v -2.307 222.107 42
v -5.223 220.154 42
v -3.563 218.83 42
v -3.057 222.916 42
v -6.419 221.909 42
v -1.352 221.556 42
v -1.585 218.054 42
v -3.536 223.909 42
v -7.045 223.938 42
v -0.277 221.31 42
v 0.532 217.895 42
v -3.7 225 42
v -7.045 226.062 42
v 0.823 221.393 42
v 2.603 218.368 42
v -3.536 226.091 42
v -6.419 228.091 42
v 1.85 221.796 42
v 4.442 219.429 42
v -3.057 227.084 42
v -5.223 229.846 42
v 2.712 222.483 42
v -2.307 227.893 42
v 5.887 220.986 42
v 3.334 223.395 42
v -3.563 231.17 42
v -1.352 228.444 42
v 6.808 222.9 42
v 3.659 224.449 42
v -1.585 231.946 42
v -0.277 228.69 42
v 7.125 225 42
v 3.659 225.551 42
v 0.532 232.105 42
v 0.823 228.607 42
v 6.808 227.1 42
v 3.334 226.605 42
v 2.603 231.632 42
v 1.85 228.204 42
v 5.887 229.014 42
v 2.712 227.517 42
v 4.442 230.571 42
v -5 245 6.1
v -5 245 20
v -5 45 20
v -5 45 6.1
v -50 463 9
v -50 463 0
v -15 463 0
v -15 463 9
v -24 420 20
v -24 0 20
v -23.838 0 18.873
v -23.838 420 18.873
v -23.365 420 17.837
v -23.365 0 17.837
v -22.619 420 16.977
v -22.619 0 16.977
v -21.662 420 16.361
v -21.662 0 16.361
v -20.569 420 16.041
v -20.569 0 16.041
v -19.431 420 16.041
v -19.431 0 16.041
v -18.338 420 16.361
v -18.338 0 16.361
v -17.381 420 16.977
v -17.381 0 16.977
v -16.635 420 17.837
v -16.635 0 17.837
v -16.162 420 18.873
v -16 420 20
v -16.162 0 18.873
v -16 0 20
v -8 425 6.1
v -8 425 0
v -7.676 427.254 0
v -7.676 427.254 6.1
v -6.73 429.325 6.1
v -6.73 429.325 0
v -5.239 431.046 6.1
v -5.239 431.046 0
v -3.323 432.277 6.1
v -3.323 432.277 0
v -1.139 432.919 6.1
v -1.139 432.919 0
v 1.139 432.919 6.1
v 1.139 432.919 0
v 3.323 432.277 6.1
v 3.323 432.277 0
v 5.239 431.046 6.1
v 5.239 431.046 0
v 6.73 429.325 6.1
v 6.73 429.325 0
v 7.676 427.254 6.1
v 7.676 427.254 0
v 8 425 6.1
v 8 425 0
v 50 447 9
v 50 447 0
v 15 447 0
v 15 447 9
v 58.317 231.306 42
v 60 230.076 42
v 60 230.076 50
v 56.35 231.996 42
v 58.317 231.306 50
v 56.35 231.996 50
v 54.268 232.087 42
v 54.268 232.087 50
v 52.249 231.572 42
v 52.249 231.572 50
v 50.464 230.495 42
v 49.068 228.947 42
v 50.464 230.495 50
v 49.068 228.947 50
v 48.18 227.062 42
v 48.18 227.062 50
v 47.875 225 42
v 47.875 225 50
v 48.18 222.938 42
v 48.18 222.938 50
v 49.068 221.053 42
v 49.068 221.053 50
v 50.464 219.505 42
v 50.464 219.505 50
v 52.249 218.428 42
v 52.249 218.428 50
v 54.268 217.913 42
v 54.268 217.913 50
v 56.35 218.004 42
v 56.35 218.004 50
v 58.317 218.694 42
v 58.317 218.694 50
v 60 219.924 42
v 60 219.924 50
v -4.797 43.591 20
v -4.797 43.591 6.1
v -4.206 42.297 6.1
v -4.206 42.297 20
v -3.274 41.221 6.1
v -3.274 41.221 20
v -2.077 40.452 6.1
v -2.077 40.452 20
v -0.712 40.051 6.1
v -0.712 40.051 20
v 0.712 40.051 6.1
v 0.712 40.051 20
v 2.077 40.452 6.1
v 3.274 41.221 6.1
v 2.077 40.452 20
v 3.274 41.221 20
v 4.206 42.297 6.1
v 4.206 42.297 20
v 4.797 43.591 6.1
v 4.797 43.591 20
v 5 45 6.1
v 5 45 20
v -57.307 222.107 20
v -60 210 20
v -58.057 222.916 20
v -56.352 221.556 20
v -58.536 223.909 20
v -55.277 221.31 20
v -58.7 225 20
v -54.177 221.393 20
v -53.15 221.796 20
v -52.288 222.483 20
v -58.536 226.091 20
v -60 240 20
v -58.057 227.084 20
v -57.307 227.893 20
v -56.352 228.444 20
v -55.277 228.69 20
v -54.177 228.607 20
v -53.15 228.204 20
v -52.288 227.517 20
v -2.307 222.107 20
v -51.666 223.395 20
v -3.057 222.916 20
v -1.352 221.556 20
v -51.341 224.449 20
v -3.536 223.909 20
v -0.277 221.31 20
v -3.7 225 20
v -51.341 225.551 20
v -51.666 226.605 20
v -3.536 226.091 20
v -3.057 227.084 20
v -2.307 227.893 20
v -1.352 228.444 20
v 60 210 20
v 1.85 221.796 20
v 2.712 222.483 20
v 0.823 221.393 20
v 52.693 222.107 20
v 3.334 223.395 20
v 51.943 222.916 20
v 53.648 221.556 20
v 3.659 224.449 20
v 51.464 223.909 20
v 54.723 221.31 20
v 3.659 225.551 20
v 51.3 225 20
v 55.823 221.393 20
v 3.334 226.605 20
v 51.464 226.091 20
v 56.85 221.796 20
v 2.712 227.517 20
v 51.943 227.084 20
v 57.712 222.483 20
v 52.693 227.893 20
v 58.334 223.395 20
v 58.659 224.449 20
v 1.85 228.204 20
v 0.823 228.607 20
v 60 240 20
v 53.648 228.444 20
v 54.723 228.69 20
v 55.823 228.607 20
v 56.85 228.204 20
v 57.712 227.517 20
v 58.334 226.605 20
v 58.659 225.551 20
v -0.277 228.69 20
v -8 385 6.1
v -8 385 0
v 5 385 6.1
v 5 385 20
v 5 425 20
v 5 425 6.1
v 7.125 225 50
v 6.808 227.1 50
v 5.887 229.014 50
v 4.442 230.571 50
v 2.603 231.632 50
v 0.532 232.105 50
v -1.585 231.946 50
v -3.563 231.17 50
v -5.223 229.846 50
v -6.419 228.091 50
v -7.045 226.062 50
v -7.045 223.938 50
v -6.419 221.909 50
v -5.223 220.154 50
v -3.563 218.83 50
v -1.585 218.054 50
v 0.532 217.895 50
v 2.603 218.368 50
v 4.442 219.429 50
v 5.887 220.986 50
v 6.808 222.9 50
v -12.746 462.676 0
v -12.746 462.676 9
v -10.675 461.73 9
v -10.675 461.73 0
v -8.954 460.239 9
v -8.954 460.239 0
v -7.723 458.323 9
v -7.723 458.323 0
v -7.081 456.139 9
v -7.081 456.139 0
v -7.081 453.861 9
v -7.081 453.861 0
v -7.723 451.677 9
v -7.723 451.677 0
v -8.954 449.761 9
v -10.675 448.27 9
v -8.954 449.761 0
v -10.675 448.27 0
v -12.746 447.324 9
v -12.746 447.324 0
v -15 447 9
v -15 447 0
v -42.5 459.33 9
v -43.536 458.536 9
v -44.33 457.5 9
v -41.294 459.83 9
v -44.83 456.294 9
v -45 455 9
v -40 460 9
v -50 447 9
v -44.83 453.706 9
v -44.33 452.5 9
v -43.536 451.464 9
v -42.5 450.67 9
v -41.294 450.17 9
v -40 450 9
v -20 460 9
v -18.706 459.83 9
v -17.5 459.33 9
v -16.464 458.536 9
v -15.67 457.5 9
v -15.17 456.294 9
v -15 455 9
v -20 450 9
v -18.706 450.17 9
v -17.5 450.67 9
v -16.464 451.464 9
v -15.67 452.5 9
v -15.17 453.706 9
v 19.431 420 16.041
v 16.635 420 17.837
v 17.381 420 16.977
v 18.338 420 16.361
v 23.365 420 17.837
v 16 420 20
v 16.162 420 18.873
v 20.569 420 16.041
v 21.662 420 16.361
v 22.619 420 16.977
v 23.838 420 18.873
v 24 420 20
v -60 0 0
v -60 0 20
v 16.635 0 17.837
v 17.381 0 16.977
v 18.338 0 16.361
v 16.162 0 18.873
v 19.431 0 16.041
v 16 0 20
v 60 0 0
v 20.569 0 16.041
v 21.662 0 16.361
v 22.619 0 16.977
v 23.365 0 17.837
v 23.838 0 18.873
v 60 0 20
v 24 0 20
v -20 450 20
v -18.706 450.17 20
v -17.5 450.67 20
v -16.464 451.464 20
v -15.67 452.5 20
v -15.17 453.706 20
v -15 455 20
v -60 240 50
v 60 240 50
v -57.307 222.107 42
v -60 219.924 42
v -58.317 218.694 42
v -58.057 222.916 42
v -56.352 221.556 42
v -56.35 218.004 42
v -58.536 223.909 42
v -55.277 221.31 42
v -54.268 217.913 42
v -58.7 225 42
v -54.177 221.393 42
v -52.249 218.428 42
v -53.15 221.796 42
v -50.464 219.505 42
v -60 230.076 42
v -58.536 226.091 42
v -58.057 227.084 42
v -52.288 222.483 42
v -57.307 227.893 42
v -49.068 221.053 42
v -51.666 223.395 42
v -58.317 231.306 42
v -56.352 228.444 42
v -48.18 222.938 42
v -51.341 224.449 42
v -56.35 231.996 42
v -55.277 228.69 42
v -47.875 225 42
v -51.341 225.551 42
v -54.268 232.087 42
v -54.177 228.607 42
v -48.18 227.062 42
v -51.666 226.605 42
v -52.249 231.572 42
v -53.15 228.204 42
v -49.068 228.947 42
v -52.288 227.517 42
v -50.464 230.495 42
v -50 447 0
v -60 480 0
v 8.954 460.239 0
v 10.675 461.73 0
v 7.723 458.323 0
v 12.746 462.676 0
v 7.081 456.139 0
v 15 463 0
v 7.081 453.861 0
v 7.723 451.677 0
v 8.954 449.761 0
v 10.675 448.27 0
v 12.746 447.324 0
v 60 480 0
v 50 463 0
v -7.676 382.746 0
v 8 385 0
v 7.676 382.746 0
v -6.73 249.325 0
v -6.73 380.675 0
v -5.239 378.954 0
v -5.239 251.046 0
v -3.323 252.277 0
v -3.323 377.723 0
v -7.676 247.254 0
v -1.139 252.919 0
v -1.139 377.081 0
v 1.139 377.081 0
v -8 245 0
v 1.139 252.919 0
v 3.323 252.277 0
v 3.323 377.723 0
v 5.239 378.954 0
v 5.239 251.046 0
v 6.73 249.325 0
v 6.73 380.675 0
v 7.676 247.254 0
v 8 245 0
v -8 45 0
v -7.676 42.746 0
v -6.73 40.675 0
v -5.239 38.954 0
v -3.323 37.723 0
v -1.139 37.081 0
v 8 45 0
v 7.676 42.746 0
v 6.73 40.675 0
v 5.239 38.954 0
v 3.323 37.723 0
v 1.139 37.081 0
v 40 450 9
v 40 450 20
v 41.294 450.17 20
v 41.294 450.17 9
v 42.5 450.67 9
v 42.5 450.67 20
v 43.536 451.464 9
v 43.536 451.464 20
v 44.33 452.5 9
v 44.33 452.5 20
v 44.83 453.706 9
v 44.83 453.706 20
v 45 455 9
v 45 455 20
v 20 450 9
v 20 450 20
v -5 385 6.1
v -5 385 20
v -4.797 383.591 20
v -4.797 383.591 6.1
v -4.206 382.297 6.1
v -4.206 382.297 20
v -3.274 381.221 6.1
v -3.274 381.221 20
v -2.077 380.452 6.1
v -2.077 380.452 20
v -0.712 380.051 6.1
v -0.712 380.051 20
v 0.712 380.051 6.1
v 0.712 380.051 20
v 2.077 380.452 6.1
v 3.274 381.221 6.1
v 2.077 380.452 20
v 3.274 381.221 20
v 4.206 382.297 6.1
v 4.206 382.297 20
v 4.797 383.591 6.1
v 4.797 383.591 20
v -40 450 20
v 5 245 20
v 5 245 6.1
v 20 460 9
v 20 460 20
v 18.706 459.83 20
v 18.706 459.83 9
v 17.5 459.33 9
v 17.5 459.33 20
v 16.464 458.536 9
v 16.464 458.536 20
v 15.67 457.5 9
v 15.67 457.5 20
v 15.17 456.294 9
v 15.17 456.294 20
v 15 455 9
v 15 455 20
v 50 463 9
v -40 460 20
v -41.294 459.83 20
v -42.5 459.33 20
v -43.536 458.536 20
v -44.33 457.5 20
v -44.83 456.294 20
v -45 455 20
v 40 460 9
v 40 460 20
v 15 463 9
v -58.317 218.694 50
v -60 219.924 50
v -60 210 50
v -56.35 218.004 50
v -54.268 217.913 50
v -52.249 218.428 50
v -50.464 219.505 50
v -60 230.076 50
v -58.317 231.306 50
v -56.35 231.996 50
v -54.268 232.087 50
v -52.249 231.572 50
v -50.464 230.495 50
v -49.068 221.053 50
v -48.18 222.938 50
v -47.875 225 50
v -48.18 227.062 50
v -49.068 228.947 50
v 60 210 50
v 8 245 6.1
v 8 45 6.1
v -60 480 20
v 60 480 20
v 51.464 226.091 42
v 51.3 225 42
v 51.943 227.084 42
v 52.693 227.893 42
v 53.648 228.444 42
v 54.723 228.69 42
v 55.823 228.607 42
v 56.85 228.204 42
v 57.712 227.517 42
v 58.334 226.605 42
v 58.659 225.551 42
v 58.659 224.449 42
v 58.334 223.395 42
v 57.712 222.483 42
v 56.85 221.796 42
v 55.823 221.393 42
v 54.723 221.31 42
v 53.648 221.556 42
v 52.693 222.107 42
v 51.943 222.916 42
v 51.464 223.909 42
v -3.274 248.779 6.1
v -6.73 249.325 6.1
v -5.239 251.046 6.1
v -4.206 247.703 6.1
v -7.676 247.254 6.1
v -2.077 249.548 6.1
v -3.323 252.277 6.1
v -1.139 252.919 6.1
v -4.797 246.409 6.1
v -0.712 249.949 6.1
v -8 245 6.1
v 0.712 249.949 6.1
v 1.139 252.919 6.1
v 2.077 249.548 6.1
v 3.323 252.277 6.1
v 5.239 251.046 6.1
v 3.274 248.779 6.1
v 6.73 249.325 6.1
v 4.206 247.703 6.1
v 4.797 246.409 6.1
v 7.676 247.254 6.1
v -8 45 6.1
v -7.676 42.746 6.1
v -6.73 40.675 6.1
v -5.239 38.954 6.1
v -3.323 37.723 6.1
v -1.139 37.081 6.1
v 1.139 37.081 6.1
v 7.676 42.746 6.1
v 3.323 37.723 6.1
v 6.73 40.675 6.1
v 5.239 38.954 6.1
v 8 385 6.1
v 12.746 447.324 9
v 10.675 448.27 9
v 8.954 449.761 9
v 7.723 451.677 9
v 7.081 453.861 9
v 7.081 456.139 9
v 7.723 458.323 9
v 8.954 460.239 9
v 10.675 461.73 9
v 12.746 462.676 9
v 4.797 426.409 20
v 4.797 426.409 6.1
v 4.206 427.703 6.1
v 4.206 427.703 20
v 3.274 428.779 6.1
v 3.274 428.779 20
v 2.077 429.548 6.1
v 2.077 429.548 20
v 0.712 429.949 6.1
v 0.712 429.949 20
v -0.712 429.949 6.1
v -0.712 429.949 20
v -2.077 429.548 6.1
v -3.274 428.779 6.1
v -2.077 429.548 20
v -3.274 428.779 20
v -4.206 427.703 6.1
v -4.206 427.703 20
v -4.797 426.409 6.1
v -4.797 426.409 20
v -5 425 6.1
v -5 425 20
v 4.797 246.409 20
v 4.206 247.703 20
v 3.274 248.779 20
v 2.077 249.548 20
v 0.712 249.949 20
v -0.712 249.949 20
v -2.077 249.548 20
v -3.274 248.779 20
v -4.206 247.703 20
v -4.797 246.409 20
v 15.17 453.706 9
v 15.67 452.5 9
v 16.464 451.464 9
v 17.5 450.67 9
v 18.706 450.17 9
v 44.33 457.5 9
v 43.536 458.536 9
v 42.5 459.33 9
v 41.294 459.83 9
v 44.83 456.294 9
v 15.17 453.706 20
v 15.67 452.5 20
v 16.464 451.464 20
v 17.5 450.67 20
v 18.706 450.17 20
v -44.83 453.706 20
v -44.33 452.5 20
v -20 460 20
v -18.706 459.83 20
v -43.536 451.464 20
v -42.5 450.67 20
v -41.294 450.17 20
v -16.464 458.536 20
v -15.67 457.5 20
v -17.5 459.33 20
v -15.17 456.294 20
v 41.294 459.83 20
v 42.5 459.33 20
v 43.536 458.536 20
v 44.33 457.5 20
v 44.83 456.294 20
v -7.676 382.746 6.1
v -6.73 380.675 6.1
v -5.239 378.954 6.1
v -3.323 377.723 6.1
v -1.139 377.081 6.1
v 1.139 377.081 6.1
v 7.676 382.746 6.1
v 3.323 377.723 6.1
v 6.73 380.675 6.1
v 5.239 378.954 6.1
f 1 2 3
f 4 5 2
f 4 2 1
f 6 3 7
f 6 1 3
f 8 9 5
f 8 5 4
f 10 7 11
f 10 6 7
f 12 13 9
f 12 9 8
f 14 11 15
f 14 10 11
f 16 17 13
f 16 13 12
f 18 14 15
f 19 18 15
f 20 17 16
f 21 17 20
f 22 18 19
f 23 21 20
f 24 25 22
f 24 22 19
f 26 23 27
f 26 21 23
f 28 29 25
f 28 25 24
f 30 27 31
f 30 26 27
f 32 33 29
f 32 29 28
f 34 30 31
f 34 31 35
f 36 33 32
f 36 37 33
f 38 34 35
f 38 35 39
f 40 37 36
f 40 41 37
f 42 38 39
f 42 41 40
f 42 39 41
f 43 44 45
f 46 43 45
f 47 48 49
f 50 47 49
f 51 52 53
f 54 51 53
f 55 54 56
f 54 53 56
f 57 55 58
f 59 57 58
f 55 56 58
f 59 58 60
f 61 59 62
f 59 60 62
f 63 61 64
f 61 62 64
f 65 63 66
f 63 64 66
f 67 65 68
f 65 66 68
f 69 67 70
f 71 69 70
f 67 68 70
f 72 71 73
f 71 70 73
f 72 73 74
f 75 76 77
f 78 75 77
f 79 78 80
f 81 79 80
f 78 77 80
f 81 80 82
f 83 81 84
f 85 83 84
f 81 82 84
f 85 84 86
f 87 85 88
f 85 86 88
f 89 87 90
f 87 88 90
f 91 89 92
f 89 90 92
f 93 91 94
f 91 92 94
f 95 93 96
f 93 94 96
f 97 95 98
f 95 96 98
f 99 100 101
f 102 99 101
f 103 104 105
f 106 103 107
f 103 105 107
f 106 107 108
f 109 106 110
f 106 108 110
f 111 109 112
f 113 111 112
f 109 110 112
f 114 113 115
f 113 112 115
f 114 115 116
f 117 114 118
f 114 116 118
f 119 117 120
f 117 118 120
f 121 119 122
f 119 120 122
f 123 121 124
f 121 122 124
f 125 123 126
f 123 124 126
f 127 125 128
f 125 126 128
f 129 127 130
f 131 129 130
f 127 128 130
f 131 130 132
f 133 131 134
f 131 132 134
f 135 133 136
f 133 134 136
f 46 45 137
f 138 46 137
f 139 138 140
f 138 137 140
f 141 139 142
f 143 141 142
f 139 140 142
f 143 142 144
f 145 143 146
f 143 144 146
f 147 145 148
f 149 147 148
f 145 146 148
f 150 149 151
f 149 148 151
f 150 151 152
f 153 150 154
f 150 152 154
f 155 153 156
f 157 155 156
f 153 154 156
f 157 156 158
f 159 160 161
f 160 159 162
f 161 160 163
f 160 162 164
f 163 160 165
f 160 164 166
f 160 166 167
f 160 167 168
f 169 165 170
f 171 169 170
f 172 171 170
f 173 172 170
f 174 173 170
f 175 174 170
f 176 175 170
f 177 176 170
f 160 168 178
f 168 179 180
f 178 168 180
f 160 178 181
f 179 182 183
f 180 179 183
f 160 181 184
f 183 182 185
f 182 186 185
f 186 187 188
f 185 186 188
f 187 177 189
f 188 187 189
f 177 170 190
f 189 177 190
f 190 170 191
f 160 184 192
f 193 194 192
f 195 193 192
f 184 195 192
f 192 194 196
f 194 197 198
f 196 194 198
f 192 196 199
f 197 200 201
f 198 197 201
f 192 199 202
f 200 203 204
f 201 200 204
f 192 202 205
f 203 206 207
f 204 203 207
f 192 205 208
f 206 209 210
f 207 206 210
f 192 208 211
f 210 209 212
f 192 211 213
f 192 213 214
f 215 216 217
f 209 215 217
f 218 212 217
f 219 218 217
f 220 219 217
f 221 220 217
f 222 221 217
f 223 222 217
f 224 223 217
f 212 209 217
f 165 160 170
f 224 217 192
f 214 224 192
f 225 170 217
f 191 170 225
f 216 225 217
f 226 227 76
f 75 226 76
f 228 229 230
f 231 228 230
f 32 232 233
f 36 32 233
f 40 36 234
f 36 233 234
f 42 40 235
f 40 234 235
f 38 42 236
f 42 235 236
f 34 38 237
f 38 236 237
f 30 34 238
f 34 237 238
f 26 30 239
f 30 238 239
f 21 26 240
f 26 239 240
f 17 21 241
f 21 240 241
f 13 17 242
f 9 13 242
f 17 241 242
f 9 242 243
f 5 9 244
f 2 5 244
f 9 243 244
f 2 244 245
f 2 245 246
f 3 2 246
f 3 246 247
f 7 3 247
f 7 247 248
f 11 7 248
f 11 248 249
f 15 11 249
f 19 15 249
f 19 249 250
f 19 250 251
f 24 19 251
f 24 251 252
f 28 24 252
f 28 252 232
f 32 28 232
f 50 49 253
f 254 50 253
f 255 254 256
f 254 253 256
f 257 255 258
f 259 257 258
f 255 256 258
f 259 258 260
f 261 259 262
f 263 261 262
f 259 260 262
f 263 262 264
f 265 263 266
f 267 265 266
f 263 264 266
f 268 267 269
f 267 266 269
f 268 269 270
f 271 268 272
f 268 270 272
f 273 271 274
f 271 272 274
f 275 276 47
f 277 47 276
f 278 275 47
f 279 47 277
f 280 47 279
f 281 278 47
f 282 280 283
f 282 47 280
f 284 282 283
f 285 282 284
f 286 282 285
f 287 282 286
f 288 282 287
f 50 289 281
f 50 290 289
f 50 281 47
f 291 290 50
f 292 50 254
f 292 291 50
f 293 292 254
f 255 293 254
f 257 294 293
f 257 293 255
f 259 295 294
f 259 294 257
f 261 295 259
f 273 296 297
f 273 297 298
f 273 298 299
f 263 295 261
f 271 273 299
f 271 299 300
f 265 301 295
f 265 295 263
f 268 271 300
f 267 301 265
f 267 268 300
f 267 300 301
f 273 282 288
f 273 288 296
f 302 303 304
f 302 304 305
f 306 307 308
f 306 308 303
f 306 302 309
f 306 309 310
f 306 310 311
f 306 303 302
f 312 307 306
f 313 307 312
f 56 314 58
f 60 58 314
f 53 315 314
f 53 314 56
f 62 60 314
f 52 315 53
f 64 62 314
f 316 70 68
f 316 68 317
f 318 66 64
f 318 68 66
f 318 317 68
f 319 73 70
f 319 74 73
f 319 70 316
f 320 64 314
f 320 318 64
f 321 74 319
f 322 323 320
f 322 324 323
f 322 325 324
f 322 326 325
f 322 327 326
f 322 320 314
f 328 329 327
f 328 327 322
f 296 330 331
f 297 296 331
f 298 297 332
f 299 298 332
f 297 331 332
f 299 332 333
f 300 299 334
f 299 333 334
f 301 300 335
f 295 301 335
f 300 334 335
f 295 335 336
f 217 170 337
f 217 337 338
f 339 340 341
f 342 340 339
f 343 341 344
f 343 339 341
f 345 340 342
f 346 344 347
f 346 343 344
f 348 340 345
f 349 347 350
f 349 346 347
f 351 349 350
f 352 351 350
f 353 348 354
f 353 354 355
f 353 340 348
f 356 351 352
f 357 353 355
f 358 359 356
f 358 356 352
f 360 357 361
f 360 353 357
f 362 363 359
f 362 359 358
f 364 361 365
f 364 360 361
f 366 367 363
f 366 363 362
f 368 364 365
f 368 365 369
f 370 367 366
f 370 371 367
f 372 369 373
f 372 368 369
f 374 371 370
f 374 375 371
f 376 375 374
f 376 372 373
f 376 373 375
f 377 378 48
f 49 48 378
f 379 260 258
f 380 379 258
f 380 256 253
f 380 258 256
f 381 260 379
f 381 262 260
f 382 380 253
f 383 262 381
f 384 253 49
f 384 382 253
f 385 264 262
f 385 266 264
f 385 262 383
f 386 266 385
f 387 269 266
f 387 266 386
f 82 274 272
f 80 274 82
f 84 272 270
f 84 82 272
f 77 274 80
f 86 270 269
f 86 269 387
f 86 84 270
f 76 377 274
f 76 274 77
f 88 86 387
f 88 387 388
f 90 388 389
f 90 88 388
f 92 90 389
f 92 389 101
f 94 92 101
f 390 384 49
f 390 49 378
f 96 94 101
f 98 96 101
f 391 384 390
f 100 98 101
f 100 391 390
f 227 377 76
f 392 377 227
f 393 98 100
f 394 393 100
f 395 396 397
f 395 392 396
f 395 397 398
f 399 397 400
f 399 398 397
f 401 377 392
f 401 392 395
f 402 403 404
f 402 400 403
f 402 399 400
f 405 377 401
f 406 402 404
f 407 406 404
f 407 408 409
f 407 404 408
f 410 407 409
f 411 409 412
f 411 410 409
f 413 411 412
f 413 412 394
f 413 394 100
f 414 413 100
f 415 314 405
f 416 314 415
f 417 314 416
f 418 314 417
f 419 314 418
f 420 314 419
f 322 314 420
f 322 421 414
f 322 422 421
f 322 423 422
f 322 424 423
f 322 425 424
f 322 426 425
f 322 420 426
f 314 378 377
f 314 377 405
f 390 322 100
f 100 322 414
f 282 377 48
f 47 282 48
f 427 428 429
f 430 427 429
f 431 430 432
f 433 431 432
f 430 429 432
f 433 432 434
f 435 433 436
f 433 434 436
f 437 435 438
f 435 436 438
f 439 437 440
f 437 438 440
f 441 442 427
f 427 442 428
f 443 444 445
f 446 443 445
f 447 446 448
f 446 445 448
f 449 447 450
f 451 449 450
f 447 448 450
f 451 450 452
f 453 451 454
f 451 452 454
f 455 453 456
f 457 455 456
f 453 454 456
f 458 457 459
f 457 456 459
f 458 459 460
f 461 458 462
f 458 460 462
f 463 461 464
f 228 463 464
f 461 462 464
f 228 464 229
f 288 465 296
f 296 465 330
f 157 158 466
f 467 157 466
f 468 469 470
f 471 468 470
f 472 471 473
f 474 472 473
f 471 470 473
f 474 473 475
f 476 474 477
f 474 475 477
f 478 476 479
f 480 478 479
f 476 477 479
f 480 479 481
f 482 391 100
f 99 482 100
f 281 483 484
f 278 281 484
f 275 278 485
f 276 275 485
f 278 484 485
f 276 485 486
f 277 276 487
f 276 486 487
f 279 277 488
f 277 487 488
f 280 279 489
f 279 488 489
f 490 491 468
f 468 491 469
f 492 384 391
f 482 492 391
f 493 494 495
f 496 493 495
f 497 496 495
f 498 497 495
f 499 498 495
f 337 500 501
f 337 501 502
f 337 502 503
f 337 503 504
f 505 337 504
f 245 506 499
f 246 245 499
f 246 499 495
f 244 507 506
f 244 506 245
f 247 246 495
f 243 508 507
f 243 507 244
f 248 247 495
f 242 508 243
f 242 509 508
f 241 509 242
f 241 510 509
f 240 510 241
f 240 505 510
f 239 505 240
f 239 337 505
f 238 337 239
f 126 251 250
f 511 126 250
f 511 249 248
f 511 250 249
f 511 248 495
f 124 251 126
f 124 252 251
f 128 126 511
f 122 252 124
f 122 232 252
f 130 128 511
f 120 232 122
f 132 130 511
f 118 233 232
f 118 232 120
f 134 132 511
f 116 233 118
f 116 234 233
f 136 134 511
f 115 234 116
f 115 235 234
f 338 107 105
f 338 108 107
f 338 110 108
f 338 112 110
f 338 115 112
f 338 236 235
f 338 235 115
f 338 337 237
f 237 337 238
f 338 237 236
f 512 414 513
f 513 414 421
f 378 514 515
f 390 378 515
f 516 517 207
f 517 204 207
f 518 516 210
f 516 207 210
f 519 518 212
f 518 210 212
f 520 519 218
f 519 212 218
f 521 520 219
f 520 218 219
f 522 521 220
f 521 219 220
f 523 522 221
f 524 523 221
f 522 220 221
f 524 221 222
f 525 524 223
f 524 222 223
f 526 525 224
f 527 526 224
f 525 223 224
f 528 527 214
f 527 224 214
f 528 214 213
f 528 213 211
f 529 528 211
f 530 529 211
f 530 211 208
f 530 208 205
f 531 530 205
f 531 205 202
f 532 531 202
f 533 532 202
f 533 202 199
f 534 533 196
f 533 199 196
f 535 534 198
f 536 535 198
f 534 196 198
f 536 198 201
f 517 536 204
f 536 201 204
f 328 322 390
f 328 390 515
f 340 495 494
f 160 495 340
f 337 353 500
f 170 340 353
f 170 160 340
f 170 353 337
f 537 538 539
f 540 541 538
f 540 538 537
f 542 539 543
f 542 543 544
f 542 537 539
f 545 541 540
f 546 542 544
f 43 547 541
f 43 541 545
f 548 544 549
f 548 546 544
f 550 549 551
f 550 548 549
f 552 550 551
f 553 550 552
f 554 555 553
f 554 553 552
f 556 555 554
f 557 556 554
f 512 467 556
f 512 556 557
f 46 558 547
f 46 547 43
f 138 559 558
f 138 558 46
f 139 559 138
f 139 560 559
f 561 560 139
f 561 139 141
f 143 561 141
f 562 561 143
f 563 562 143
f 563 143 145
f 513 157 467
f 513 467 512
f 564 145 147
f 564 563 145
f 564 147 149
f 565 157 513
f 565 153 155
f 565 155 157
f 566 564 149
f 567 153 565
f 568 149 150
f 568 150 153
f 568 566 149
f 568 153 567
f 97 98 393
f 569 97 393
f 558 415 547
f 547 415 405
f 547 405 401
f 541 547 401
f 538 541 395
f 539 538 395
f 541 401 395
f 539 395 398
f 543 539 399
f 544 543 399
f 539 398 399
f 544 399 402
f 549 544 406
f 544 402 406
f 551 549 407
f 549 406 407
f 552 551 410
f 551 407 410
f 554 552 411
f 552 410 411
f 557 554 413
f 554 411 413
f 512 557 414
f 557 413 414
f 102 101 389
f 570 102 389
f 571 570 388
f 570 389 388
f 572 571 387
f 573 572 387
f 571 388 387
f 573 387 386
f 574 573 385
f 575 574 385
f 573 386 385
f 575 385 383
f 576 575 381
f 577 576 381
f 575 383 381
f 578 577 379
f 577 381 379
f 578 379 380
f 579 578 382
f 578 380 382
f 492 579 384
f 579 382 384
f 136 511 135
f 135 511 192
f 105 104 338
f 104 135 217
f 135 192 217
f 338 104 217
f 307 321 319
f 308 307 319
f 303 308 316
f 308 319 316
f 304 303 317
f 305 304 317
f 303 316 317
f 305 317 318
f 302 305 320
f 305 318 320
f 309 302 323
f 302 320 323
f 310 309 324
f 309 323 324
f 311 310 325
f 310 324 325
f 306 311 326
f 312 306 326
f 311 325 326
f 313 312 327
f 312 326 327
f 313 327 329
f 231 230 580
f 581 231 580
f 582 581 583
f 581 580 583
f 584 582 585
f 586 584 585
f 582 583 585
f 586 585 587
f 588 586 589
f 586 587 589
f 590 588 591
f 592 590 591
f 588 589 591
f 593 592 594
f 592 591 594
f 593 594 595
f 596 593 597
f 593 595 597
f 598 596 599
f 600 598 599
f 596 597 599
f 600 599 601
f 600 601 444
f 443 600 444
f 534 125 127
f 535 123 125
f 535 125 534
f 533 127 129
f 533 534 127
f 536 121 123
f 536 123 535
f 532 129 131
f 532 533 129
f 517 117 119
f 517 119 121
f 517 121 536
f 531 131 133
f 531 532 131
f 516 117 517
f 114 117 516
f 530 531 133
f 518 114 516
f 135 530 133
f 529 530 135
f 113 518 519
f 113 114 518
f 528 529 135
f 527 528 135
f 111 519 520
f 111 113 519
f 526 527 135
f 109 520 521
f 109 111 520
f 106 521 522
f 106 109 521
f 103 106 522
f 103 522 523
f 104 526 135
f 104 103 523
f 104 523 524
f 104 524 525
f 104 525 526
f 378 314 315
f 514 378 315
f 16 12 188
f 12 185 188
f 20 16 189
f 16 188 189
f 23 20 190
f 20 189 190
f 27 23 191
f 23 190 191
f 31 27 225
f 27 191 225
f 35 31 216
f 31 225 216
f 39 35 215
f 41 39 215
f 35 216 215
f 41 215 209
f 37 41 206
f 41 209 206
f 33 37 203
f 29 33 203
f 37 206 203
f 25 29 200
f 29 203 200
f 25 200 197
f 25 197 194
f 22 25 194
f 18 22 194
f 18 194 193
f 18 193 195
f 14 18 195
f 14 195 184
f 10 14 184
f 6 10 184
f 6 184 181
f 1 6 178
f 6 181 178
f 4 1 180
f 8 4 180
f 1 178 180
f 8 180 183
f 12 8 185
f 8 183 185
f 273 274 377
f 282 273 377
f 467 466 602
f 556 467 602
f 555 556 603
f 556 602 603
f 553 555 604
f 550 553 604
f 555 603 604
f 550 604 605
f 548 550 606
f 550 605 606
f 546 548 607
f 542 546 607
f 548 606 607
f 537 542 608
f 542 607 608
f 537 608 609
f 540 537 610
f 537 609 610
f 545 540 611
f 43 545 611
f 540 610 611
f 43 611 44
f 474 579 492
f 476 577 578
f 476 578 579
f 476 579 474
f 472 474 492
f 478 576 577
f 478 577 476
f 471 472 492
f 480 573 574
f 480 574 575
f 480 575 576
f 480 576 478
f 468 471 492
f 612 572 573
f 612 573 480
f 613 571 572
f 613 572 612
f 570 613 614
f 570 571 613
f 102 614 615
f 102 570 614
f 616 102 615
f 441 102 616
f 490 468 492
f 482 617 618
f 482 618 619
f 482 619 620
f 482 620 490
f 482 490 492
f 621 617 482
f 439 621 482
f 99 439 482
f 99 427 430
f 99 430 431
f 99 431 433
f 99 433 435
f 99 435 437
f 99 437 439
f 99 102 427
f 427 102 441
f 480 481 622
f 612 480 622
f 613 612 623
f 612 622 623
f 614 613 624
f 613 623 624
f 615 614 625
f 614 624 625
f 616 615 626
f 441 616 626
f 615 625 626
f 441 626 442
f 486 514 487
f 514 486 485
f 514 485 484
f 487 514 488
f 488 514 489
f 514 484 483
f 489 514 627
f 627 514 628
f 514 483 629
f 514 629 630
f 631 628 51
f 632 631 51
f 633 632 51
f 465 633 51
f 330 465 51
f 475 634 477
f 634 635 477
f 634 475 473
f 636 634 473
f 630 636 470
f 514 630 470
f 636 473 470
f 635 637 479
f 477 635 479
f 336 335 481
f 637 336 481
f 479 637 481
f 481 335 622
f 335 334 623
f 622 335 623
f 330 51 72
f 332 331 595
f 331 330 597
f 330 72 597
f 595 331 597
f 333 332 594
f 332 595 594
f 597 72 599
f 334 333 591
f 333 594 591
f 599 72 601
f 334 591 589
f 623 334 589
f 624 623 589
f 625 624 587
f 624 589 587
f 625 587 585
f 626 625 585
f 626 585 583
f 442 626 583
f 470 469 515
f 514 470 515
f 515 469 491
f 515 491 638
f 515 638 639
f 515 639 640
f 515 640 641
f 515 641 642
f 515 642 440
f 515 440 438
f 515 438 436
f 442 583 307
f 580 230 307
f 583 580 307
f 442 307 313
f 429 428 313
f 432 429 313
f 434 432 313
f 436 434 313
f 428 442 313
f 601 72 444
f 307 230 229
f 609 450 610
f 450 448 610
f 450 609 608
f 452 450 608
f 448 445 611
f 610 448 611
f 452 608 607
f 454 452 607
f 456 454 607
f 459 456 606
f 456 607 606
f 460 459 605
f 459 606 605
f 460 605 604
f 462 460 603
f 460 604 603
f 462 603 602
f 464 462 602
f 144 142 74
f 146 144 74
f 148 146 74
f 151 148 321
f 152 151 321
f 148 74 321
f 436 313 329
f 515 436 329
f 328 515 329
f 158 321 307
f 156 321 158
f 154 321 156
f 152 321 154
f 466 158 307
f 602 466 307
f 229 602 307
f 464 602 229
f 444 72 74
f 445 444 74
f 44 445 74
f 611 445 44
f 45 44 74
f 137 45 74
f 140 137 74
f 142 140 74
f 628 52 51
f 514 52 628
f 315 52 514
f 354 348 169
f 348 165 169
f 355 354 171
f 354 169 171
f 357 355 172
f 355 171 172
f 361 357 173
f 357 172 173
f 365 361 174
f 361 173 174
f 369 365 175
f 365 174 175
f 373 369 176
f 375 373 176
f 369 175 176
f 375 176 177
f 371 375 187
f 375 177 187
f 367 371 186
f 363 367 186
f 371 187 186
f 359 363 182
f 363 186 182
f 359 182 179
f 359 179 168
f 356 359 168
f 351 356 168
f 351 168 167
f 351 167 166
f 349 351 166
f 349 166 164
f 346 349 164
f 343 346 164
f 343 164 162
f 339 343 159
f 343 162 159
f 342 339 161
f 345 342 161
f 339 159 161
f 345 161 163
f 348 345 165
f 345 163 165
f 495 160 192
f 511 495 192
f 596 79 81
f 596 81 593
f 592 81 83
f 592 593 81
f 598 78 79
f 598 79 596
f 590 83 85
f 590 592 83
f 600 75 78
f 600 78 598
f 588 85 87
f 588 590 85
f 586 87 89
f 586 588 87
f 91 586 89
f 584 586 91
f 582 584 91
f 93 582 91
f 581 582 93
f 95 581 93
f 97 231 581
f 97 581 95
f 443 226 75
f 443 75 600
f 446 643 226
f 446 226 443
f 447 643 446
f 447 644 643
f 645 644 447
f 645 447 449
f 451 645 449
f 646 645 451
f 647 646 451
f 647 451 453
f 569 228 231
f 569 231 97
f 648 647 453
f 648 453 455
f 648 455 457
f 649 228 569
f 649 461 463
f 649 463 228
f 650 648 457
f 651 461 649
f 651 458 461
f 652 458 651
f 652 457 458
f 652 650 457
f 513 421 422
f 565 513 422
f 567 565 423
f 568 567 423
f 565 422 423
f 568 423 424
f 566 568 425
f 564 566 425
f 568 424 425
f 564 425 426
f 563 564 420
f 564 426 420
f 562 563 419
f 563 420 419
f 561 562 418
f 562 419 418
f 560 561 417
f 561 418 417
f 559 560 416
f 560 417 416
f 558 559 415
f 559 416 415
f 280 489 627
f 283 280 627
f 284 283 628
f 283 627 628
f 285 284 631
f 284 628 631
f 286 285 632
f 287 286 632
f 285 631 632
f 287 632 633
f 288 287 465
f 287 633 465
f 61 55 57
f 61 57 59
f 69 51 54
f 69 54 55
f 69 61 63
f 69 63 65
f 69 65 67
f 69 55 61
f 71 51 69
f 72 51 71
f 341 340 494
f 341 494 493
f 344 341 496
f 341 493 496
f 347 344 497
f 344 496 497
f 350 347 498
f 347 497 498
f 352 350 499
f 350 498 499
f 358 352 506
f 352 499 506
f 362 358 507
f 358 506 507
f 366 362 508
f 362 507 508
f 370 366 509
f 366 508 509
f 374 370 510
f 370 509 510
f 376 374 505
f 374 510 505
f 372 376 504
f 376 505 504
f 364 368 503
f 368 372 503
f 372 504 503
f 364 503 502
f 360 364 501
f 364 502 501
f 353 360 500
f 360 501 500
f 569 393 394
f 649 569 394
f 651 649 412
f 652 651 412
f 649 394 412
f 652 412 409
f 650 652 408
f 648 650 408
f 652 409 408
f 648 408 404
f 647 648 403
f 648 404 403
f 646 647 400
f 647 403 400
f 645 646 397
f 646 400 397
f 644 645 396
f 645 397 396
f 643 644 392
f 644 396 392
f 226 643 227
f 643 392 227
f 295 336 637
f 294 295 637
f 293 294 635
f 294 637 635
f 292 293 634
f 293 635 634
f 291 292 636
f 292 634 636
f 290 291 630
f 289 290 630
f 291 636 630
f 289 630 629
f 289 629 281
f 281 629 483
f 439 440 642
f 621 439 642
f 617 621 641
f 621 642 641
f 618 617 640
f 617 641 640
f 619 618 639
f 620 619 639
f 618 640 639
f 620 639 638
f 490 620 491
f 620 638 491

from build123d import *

# Parameters (mm, degrees)
F0_W            = 120
F0_H            = 20
F1_DEPTH        = 480
F3_DEPTH        = 20.001
F5_DEPTH        = 6.1
F7_DEPTH        = 20.001
F9_DEPTH        = 9
F11_DEPTH       = 420
F12_W           = 120
F12_H           = 30
F13_DEPTH       = 30
F15_D           = 7.4
F15_DEPTH       = 50
F15_CBORE_D     = 14.25
F15_CBORE_DEPTH = 8
F15_TIP         = 2.2231842904


# Not quite as in the source:
# - a feature names something its author has since deleted; it is built from what else it names


with BuildPart() as f1:
    # F0 (on Front) → F1 (new body)
    with BuildSketch(Plane.XZ):
        with Locations((0, 10)):
            Rectangle(F0_W, F0_H)
    extrude(amount=-F1_DEPTH)

    # F2 (on face) → F3 (cut, through all)
    with BuildSketch(Plane.XY.offset(20)):
        with BuildLine():
            ThreePointArc((5, 245), (0, 250), (-5, 245))
            Line((-5, 245), (-5, 45))
            ThreePointArc((-5, 45), (0, 40), (5, 45))
            Line((5, 45), (5, 245))
        make_face()
        with BuildLine():
            ThreePointArc((5, 425), (0, 430), (-5, 425))
            Line((-5, 425), (-5, 385))
            ThreePointArc((-5, 385), (0, 380), (5, 385))
            Line((5, 385), (5, 425))
        make_face()
    extrude(amount=-F3_DEPTH, mode=Mode.SUBTRACT)

    # F4 (on face) → F5 (cut)
    with BuildSketch(Plane(origin=(0, 0, 0), x_dir=(1, 0, 0), z_dir=(0, 0, -1))):
        with BuildLine():
            Line((8, -245), (8, -45))
            ThreePointArc((8, -45), (0, -37), (-8, -45))
            Line((-8, -45), (-8, -245))
            ThreePointArc((-8, -245), (0, -253), (8, -245))
        make_face()
        with BuildLine():
            ThreePointArc((8, -385), (0, -377), (-8, -385))
            Line((-8, -385), (-8, -425))
            ThreePointArc((-8, -425), (0, -433), (8, -425))
            Line((8, -425), (8, -385))
        make_face()
    extrude(amount=-F5_DEPTH, mode=Mode.SUBTRACT)

    # F6 (on face) → F7 (cut, through all)
    with BuildSketch(Plane.XY.offset(20)):
        with BuildLine():
            ThreePointArc((-45, 455), (-43.5355339059, 451.4644660941), (-40, 450))
            Line((-40, 450), (-20, 450))
            ThreePointArc((-20, 450), (-16.4644660941, 451.4644660941), (-15, 455))
            ThreePointArc((-15, 455), (-16.4644660941, 458.5355339059), (-20, 460))
            Line((-20, 460), (-40, 460))
            ThreePointArc((-40, 460), (-43.5355339059, 458.5355339059), (-45, 455))
        make_face()
        with BuildLine():
            ThreePointArc((45, 455), (43.5355339059, 458.5355339059), (40, 460))
            Line((40, 460), (20, 460))
            ThreePointArc((20, 460), (16.4644660941, 458.5355339059), (15, 455))
            ThreePointArc((15, 455), (16.4644660941, 451.4644660941), (20, 450))
            Line((20, 450), (40, 450))
            ThreePointArc((40, 450), (43.5355339059, 451.4644660941), (45, 455))
        make_face()
    extrude(amount=-F7_DEPTH, mode=Mode.SUBTRACT)

    # F8 (on face) → F9 (cut)
    with BuildSketch(Plane(origin=(0, 0, 0), x_dir=(1, 0, 0), z_dir=(0, 0, -1))):
        with BuildLine():
            Line((-15, -447), (-50, -447))
            Line((-50, -447), (-50, -463))
            Line((-50, -463), (-15, -463))
            ThreePointArc((-15, -463), (-7, -455), (-15, -447))
        make_face()
        with BuildLine():
            Line((50, -447), (15, -447))
            ThreePointArc((15, -447), (7, -455), (15, -463))
            Line((15, -463), (50, -463))
            Line((50, -463), (50, -447))
        make_face()
    extrude(amount=-F9_DEPTH, mode=Mode.SUBTRACT)

    # F10 (on face) → F11 (cut)
    with BuildSketch(Plane.XZ):
        with BuildLine():
            ThreePointArc((-24, 20), (-20, 16), (-16, 20))
            Line((-16, 20), (-24, 20))
        make_face()
        with BuildLine():
            Line((24, 20), (16, 20))
            ThreePointArc((16, 20), (20, 16), (24, 20))
        make_face()
    extrude(amount=-F11_DEPTH, mode=Mode.SUBTRACT)


with BuildPart() as f13:
    # F12 (on face) → F13 (new body)
    with BuildSketch(Plane.XY.offset(20)):
        with Locations((0, 225)):
            Rectangle(F12_W, F12_H)
    extrude(amount=F13_DEPTH)

    # F15
    with Locations(Plane.XY.offset(50)):
        with Locations((-55, 225), (55, 225), (0, 225)):
            CounterBoreHole(F15_D / 2, F15_CBORE_D / 2, F15_CBORE_DEPTH, depth=F15_DEPTH)
            with Locations((0, 0, -(F15_DEPTH + F15_TIP / 2))):  # 118° drill point
                Cone(0, F15_D / 2, F15_TIP, mode=Mode.SUBTRACT)


solid = Compound([f1.part, f13.part])
